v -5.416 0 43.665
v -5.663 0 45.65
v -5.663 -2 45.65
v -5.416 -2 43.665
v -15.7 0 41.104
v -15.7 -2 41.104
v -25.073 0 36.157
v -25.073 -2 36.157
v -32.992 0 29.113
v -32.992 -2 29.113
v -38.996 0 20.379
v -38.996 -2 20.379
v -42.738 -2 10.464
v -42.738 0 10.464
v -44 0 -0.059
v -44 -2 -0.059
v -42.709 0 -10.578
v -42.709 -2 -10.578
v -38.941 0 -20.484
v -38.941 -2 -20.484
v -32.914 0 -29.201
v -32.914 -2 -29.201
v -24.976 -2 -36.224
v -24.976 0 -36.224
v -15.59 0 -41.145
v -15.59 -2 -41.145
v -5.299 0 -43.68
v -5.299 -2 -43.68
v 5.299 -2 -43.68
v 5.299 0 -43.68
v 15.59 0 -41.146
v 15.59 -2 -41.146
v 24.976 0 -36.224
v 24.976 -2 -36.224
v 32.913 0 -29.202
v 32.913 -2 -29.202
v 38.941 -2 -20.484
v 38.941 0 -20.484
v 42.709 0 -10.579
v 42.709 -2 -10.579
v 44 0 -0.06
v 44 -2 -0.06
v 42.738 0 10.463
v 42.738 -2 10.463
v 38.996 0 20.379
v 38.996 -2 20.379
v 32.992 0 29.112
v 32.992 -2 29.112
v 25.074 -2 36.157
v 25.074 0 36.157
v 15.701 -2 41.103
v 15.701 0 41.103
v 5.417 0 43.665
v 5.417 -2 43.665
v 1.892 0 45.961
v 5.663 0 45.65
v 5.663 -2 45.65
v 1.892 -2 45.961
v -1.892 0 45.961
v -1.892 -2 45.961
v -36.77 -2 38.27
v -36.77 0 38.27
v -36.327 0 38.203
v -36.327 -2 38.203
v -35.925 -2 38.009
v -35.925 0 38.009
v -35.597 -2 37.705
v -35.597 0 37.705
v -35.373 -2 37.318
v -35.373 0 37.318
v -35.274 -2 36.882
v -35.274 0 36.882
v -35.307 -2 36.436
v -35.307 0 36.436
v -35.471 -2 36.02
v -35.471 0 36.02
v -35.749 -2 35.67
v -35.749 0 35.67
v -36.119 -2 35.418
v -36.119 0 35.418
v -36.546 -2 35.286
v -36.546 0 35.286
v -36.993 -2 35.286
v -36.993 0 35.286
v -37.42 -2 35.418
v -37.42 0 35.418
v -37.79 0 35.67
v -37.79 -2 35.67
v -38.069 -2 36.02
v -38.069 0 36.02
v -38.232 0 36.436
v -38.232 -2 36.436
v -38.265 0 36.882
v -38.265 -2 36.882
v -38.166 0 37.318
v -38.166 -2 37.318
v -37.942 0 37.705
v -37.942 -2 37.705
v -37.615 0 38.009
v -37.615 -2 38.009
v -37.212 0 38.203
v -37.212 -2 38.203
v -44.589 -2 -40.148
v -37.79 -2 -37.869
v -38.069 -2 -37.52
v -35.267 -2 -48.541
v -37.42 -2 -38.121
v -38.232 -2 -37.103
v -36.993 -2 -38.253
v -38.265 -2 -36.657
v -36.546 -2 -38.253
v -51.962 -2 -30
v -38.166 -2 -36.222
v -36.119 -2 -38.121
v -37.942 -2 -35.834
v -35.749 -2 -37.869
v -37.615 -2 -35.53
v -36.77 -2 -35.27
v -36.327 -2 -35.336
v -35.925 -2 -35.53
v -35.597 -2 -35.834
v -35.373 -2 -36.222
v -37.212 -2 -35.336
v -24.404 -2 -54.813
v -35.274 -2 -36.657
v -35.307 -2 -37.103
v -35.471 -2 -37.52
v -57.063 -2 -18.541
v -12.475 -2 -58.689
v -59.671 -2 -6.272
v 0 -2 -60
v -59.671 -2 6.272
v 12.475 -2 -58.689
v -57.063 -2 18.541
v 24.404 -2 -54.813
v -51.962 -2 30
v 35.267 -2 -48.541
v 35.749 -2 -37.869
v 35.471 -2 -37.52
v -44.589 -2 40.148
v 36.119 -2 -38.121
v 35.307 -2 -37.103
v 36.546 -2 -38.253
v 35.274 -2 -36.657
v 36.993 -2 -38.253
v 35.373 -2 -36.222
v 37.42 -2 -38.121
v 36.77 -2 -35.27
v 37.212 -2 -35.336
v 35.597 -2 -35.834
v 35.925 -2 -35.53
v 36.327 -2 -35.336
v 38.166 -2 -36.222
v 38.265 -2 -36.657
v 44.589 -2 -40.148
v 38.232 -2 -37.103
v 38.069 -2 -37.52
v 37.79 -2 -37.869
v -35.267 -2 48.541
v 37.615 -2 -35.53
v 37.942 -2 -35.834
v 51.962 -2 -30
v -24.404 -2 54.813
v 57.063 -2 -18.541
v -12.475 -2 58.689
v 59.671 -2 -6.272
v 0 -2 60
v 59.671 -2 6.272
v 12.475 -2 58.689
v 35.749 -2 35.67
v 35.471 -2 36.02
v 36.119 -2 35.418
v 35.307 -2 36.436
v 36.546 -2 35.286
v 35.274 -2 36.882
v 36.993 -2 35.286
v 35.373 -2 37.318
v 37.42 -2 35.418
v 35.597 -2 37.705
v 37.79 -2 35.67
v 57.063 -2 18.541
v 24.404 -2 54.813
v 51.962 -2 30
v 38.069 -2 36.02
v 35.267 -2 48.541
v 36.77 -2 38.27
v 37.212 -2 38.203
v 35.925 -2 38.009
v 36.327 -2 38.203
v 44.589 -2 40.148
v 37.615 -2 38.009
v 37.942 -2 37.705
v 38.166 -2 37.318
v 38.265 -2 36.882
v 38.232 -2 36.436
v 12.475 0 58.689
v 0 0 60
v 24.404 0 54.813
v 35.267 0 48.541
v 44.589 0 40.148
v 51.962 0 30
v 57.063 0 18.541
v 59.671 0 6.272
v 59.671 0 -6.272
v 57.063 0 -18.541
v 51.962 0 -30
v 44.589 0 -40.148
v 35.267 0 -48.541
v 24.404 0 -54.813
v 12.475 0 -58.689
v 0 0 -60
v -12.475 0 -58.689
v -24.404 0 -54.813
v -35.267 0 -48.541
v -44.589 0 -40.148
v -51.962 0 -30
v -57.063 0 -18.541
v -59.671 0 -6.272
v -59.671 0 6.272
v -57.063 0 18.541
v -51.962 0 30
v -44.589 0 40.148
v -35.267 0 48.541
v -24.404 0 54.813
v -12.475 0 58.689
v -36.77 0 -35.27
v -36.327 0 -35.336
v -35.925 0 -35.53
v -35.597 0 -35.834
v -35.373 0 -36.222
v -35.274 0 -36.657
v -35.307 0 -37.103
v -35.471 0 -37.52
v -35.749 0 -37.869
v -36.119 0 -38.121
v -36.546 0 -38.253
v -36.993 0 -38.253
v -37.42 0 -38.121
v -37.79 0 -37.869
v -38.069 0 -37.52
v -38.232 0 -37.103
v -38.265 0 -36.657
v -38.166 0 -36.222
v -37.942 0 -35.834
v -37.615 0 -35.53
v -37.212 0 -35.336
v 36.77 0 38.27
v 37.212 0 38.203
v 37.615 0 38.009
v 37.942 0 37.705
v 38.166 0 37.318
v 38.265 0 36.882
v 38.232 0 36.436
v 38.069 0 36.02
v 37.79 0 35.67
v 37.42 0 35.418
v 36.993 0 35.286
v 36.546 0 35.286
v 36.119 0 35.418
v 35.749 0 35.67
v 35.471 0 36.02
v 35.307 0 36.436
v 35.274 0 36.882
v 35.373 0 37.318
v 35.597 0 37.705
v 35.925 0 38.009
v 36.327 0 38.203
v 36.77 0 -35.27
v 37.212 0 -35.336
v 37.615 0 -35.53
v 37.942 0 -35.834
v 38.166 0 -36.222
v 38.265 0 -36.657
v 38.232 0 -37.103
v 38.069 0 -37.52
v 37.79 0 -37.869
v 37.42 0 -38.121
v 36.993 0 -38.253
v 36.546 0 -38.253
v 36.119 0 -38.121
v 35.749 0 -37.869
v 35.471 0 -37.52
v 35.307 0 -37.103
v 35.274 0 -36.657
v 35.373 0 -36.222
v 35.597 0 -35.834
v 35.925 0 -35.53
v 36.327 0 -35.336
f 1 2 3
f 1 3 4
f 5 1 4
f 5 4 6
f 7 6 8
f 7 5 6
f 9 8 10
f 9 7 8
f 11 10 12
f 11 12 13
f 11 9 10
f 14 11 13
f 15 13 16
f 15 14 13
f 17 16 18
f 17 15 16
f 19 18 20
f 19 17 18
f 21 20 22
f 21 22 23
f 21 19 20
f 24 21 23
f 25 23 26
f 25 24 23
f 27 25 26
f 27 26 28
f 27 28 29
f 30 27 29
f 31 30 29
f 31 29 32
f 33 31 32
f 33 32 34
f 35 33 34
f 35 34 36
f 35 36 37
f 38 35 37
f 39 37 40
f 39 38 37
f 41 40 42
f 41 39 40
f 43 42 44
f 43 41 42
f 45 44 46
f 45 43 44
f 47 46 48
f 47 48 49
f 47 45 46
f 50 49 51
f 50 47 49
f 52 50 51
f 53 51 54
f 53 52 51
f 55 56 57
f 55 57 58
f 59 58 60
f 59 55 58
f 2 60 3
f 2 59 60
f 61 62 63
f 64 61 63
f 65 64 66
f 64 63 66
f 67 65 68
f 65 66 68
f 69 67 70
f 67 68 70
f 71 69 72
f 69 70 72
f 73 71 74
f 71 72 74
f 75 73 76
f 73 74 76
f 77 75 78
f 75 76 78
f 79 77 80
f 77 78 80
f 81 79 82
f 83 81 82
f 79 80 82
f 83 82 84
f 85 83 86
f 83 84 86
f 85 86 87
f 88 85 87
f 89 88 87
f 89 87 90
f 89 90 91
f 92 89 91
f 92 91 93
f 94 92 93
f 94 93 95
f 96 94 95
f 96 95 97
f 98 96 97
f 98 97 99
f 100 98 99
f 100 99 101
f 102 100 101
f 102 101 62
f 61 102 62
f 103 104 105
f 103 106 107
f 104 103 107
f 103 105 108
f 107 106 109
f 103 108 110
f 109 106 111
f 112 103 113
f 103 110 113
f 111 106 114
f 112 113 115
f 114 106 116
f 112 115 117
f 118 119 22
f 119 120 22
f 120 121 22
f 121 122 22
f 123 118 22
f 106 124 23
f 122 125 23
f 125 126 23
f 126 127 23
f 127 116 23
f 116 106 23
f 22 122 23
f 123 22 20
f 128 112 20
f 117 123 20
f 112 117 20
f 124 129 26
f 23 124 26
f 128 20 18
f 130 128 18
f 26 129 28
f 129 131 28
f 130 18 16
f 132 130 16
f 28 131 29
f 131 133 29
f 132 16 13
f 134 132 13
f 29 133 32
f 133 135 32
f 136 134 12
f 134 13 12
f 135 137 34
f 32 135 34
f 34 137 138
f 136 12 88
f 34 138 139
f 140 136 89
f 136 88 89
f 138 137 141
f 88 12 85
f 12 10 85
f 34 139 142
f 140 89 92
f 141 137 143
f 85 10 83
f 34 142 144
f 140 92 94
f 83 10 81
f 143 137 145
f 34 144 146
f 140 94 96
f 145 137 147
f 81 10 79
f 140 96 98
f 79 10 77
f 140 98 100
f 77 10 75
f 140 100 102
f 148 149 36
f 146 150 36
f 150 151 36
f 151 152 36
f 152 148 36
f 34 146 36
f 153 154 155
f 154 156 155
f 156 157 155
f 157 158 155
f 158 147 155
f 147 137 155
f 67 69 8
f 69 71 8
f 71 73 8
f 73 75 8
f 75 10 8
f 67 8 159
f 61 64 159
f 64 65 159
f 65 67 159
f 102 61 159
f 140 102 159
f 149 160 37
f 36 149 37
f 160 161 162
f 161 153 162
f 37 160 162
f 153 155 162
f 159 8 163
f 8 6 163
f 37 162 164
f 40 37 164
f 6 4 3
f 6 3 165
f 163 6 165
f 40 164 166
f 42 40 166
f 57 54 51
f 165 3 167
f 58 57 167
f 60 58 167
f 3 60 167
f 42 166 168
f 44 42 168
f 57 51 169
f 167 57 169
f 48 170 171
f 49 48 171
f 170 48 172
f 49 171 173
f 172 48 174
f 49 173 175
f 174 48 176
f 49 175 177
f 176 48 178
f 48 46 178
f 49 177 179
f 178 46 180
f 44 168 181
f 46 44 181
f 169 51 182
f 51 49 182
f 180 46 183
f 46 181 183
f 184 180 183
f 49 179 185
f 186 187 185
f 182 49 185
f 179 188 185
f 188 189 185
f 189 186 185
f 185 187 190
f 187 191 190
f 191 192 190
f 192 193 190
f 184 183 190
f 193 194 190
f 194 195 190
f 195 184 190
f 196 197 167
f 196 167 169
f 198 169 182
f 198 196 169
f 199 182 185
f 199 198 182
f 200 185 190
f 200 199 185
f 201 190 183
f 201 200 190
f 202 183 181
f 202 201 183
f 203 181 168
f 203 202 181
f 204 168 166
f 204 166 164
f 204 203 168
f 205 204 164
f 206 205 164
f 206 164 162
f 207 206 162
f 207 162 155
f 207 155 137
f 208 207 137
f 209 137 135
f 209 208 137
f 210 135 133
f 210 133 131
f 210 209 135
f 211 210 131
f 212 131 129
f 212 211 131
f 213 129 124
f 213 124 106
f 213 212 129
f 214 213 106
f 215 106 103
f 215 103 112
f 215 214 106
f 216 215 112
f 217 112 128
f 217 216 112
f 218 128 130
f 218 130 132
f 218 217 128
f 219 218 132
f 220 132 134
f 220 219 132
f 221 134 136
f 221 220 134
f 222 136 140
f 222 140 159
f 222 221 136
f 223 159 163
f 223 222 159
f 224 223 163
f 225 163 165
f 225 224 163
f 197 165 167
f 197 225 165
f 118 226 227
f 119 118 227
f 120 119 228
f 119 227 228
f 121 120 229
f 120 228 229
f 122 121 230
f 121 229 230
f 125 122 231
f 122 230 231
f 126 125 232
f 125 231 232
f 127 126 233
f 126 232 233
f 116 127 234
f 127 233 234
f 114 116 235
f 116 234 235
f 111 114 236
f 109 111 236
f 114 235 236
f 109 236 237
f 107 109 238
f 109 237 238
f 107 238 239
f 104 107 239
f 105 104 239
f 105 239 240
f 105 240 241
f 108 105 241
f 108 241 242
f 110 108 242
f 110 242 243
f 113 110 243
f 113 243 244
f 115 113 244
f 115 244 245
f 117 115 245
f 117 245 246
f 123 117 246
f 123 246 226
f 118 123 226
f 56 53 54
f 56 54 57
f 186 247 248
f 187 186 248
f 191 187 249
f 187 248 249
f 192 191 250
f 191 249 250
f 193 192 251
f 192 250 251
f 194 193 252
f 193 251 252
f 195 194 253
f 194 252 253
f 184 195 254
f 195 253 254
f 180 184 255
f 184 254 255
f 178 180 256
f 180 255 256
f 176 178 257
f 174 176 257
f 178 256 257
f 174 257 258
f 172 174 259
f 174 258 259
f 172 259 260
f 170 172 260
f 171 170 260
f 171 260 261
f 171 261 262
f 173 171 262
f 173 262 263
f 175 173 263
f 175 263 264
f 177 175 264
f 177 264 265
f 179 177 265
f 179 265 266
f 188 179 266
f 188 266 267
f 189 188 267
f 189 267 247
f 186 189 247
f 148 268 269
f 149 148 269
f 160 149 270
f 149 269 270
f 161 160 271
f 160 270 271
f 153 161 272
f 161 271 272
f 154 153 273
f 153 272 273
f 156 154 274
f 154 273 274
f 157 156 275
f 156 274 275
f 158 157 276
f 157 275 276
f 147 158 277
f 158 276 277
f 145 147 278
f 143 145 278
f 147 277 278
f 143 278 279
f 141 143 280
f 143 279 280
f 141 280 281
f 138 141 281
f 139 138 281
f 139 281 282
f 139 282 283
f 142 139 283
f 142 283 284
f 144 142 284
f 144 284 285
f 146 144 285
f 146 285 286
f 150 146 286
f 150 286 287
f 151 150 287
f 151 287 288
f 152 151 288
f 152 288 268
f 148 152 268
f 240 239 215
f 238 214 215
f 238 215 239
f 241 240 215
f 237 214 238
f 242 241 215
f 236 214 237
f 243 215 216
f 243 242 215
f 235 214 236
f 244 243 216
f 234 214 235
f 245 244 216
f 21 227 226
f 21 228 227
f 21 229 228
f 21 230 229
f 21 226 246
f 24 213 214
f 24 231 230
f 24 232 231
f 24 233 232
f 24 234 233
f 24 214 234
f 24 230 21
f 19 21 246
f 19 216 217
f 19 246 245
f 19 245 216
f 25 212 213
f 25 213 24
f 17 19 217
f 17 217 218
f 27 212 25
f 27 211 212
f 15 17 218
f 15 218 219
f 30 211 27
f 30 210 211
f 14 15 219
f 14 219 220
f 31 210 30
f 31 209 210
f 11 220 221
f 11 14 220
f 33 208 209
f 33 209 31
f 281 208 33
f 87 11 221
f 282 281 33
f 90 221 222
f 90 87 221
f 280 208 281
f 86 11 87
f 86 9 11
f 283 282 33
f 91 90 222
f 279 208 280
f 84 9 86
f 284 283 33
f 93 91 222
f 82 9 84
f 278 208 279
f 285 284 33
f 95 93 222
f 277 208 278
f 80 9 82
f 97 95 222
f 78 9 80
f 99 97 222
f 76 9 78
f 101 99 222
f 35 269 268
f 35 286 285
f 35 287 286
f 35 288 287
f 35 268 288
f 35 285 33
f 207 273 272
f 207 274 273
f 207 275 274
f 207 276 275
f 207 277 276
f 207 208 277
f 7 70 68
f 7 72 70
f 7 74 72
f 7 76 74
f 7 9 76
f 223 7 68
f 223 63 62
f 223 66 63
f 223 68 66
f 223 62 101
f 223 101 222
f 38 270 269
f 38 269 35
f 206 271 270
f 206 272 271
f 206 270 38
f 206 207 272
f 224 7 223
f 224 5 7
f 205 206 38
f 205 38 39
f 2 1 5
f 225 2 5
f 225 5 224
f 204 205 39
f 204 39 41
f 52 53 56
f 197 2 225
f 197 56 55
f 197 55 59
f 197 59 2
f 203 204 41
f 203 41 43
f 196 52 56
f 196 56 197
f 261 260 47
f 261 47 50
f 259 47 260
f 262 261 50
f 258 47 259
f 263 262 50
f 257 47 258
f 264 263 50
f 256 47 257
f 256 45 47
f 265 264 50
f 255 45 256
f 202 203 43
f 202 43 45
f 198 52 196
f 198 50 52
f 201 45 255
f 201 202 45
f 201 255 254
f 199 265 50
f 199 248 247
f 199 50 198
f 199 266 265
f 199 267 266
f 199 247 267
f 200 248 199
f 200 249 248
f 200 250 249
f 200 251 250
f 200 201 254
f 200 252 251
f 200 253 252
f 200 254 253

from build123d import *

# Parameters (mm, degrees)
SKETCH_1_R             = 60
SM_BASE_FLANGE_1_DEPTH = 2
CUT_EXTRUDE_1_REACH    = 86.876
SKETCH_6_R             = 1.5


# Sheet-metal steps are written as plain solids
with BuildPart() as part:
    # Sketch 1 → 基体-法兰1 (new body)
    with BuildSketch(Plane(origin=(0, 0, 0), x_dir=(1, 0, 0), z_dir=(0, 1, 0))):
        with Locations(Location((0, 0, 0), (0, 0, 270))):
            Circle(SKETCH_1_R)
        with BuildLine():
            Line((-5.662691153, -45.650125179), (-5.41648719, -43.665337128))
            ThreePointArc((-5.41648719, -43.665337128), (-0.000329002, 43.999999999), (5.41714019, -43.665256122))
            Line((5.41714019, -43.665256122), (5.663373835, -45.650040491))
            ThreePointArc((5.663373835, -45.650040491), (0.000343957, -45.999999999), (-5.662691153, -45.650125179))
        make_face(mode=Mode.SUBTRACT)
    extrude(amount=-SM_BASE_FLANGE_1_DEPTH)

    # 草图6 → 切除-拉伸1 (cut, up to next)
    with BuildSketch(Plane(origin=(0, 0, 0), x_dir=(1, 0, 0), z_dir=(0, 1, 0)), mode=Mode.PRIVATE) as cut_extrude_1_sk1:
        with Locations(Location((36.769552622, 36.769552622, 0), (0, 0, 270))):
            Circle(SKETCH_6_R)
    cut_extrude_1_tool1 = extrude(cut_extrude_1_sk1.sketch, amount=-CUT_EXTRUDE_1_REACH, mode=Mode.PRIVATE) & part.part
    # 草图6 → 切除-拉伸1 (cut, up to next)
    with BuildSketch(Plane(origin=(0, 0, 0), x_dir=(1, 0, 0), z_dir=(0, 1, 0)), mode=Mode.PRIVATE) as cut_extrude_1_sk2:
        with Locations(Location((-36.769552622, 36.769552622, 0), (0, 0, 270))):
            Circle(SKETCH_6_R)
    cut_extrude_1_tool2 = extrude(cut_extrude_1_sk2.sketch, amount=-CUT_EXTRUDE_1_REACH, mode=Mode.PRIVATE) & part.part
    # 草图6 → 切除-拉伸1 (cut, up to next)
    with BuildSketch(Plane(origin=(0, 0, 0), x_dir=(1, 0, 0), z_dir=(0, 1, 0)), mode=Mode.PRIVATE) as cut_extrude_1_sk3:
        with Locations(Location((36.769552622, -36.769552622, 0), (0, 0, 270))):
            Circle(SKETCH_6_R)
    cut_extrude_1_tool3 = extrude(cut_extrude_1_sk3.sketch, amount=-CUT_EXTRUDE_1_REACH, mode=Mode.PRIVATE) & part.part
    # 草图6 → 切除-拉伸1 (cut, up to next)
    with BuildSketch(Plane(origin=(0, 0, 0), x_dir=(1, 0, 0), z_dir=(0, 1, 0)), mode=Mode.PRIVATE) as cut_extrude_1_sk4:
        with Locations(Location((-36.769552622, -36.769552622, 0), (0, 0, 270))):
            Circle(SKETCH_6_R)
    cut_extrude_1_tool4 = extrude(cut_extrude_1_sk4.sketch, amount=-CUT_EXTRUDE_1_REACH, mode=Mode.PRIVATE) & part.part
    add(cut_extrude_1_tool1.solids().sort_by_distance((36.769553, 0, -36.769553))[0], mode=Mode.SUBTRACT)
    add(cut_extrude_1_tool2.solids().sort_by_distance((-36.769553, 0, -36.769553))[0], mode=Mode.SUBTRACT)
    add(cut_extrude_1_tool3.solids().sort_by_distance((36.769553, 0, 36.769553))[0], mode=Mode.SUBTRACT)
    add(cut_extrude_1_tool4.solids().sort_by_distance((-36.769553, 0, 36.769553))[0], mode=Mode.SUBTRACT)


solid = part.part
